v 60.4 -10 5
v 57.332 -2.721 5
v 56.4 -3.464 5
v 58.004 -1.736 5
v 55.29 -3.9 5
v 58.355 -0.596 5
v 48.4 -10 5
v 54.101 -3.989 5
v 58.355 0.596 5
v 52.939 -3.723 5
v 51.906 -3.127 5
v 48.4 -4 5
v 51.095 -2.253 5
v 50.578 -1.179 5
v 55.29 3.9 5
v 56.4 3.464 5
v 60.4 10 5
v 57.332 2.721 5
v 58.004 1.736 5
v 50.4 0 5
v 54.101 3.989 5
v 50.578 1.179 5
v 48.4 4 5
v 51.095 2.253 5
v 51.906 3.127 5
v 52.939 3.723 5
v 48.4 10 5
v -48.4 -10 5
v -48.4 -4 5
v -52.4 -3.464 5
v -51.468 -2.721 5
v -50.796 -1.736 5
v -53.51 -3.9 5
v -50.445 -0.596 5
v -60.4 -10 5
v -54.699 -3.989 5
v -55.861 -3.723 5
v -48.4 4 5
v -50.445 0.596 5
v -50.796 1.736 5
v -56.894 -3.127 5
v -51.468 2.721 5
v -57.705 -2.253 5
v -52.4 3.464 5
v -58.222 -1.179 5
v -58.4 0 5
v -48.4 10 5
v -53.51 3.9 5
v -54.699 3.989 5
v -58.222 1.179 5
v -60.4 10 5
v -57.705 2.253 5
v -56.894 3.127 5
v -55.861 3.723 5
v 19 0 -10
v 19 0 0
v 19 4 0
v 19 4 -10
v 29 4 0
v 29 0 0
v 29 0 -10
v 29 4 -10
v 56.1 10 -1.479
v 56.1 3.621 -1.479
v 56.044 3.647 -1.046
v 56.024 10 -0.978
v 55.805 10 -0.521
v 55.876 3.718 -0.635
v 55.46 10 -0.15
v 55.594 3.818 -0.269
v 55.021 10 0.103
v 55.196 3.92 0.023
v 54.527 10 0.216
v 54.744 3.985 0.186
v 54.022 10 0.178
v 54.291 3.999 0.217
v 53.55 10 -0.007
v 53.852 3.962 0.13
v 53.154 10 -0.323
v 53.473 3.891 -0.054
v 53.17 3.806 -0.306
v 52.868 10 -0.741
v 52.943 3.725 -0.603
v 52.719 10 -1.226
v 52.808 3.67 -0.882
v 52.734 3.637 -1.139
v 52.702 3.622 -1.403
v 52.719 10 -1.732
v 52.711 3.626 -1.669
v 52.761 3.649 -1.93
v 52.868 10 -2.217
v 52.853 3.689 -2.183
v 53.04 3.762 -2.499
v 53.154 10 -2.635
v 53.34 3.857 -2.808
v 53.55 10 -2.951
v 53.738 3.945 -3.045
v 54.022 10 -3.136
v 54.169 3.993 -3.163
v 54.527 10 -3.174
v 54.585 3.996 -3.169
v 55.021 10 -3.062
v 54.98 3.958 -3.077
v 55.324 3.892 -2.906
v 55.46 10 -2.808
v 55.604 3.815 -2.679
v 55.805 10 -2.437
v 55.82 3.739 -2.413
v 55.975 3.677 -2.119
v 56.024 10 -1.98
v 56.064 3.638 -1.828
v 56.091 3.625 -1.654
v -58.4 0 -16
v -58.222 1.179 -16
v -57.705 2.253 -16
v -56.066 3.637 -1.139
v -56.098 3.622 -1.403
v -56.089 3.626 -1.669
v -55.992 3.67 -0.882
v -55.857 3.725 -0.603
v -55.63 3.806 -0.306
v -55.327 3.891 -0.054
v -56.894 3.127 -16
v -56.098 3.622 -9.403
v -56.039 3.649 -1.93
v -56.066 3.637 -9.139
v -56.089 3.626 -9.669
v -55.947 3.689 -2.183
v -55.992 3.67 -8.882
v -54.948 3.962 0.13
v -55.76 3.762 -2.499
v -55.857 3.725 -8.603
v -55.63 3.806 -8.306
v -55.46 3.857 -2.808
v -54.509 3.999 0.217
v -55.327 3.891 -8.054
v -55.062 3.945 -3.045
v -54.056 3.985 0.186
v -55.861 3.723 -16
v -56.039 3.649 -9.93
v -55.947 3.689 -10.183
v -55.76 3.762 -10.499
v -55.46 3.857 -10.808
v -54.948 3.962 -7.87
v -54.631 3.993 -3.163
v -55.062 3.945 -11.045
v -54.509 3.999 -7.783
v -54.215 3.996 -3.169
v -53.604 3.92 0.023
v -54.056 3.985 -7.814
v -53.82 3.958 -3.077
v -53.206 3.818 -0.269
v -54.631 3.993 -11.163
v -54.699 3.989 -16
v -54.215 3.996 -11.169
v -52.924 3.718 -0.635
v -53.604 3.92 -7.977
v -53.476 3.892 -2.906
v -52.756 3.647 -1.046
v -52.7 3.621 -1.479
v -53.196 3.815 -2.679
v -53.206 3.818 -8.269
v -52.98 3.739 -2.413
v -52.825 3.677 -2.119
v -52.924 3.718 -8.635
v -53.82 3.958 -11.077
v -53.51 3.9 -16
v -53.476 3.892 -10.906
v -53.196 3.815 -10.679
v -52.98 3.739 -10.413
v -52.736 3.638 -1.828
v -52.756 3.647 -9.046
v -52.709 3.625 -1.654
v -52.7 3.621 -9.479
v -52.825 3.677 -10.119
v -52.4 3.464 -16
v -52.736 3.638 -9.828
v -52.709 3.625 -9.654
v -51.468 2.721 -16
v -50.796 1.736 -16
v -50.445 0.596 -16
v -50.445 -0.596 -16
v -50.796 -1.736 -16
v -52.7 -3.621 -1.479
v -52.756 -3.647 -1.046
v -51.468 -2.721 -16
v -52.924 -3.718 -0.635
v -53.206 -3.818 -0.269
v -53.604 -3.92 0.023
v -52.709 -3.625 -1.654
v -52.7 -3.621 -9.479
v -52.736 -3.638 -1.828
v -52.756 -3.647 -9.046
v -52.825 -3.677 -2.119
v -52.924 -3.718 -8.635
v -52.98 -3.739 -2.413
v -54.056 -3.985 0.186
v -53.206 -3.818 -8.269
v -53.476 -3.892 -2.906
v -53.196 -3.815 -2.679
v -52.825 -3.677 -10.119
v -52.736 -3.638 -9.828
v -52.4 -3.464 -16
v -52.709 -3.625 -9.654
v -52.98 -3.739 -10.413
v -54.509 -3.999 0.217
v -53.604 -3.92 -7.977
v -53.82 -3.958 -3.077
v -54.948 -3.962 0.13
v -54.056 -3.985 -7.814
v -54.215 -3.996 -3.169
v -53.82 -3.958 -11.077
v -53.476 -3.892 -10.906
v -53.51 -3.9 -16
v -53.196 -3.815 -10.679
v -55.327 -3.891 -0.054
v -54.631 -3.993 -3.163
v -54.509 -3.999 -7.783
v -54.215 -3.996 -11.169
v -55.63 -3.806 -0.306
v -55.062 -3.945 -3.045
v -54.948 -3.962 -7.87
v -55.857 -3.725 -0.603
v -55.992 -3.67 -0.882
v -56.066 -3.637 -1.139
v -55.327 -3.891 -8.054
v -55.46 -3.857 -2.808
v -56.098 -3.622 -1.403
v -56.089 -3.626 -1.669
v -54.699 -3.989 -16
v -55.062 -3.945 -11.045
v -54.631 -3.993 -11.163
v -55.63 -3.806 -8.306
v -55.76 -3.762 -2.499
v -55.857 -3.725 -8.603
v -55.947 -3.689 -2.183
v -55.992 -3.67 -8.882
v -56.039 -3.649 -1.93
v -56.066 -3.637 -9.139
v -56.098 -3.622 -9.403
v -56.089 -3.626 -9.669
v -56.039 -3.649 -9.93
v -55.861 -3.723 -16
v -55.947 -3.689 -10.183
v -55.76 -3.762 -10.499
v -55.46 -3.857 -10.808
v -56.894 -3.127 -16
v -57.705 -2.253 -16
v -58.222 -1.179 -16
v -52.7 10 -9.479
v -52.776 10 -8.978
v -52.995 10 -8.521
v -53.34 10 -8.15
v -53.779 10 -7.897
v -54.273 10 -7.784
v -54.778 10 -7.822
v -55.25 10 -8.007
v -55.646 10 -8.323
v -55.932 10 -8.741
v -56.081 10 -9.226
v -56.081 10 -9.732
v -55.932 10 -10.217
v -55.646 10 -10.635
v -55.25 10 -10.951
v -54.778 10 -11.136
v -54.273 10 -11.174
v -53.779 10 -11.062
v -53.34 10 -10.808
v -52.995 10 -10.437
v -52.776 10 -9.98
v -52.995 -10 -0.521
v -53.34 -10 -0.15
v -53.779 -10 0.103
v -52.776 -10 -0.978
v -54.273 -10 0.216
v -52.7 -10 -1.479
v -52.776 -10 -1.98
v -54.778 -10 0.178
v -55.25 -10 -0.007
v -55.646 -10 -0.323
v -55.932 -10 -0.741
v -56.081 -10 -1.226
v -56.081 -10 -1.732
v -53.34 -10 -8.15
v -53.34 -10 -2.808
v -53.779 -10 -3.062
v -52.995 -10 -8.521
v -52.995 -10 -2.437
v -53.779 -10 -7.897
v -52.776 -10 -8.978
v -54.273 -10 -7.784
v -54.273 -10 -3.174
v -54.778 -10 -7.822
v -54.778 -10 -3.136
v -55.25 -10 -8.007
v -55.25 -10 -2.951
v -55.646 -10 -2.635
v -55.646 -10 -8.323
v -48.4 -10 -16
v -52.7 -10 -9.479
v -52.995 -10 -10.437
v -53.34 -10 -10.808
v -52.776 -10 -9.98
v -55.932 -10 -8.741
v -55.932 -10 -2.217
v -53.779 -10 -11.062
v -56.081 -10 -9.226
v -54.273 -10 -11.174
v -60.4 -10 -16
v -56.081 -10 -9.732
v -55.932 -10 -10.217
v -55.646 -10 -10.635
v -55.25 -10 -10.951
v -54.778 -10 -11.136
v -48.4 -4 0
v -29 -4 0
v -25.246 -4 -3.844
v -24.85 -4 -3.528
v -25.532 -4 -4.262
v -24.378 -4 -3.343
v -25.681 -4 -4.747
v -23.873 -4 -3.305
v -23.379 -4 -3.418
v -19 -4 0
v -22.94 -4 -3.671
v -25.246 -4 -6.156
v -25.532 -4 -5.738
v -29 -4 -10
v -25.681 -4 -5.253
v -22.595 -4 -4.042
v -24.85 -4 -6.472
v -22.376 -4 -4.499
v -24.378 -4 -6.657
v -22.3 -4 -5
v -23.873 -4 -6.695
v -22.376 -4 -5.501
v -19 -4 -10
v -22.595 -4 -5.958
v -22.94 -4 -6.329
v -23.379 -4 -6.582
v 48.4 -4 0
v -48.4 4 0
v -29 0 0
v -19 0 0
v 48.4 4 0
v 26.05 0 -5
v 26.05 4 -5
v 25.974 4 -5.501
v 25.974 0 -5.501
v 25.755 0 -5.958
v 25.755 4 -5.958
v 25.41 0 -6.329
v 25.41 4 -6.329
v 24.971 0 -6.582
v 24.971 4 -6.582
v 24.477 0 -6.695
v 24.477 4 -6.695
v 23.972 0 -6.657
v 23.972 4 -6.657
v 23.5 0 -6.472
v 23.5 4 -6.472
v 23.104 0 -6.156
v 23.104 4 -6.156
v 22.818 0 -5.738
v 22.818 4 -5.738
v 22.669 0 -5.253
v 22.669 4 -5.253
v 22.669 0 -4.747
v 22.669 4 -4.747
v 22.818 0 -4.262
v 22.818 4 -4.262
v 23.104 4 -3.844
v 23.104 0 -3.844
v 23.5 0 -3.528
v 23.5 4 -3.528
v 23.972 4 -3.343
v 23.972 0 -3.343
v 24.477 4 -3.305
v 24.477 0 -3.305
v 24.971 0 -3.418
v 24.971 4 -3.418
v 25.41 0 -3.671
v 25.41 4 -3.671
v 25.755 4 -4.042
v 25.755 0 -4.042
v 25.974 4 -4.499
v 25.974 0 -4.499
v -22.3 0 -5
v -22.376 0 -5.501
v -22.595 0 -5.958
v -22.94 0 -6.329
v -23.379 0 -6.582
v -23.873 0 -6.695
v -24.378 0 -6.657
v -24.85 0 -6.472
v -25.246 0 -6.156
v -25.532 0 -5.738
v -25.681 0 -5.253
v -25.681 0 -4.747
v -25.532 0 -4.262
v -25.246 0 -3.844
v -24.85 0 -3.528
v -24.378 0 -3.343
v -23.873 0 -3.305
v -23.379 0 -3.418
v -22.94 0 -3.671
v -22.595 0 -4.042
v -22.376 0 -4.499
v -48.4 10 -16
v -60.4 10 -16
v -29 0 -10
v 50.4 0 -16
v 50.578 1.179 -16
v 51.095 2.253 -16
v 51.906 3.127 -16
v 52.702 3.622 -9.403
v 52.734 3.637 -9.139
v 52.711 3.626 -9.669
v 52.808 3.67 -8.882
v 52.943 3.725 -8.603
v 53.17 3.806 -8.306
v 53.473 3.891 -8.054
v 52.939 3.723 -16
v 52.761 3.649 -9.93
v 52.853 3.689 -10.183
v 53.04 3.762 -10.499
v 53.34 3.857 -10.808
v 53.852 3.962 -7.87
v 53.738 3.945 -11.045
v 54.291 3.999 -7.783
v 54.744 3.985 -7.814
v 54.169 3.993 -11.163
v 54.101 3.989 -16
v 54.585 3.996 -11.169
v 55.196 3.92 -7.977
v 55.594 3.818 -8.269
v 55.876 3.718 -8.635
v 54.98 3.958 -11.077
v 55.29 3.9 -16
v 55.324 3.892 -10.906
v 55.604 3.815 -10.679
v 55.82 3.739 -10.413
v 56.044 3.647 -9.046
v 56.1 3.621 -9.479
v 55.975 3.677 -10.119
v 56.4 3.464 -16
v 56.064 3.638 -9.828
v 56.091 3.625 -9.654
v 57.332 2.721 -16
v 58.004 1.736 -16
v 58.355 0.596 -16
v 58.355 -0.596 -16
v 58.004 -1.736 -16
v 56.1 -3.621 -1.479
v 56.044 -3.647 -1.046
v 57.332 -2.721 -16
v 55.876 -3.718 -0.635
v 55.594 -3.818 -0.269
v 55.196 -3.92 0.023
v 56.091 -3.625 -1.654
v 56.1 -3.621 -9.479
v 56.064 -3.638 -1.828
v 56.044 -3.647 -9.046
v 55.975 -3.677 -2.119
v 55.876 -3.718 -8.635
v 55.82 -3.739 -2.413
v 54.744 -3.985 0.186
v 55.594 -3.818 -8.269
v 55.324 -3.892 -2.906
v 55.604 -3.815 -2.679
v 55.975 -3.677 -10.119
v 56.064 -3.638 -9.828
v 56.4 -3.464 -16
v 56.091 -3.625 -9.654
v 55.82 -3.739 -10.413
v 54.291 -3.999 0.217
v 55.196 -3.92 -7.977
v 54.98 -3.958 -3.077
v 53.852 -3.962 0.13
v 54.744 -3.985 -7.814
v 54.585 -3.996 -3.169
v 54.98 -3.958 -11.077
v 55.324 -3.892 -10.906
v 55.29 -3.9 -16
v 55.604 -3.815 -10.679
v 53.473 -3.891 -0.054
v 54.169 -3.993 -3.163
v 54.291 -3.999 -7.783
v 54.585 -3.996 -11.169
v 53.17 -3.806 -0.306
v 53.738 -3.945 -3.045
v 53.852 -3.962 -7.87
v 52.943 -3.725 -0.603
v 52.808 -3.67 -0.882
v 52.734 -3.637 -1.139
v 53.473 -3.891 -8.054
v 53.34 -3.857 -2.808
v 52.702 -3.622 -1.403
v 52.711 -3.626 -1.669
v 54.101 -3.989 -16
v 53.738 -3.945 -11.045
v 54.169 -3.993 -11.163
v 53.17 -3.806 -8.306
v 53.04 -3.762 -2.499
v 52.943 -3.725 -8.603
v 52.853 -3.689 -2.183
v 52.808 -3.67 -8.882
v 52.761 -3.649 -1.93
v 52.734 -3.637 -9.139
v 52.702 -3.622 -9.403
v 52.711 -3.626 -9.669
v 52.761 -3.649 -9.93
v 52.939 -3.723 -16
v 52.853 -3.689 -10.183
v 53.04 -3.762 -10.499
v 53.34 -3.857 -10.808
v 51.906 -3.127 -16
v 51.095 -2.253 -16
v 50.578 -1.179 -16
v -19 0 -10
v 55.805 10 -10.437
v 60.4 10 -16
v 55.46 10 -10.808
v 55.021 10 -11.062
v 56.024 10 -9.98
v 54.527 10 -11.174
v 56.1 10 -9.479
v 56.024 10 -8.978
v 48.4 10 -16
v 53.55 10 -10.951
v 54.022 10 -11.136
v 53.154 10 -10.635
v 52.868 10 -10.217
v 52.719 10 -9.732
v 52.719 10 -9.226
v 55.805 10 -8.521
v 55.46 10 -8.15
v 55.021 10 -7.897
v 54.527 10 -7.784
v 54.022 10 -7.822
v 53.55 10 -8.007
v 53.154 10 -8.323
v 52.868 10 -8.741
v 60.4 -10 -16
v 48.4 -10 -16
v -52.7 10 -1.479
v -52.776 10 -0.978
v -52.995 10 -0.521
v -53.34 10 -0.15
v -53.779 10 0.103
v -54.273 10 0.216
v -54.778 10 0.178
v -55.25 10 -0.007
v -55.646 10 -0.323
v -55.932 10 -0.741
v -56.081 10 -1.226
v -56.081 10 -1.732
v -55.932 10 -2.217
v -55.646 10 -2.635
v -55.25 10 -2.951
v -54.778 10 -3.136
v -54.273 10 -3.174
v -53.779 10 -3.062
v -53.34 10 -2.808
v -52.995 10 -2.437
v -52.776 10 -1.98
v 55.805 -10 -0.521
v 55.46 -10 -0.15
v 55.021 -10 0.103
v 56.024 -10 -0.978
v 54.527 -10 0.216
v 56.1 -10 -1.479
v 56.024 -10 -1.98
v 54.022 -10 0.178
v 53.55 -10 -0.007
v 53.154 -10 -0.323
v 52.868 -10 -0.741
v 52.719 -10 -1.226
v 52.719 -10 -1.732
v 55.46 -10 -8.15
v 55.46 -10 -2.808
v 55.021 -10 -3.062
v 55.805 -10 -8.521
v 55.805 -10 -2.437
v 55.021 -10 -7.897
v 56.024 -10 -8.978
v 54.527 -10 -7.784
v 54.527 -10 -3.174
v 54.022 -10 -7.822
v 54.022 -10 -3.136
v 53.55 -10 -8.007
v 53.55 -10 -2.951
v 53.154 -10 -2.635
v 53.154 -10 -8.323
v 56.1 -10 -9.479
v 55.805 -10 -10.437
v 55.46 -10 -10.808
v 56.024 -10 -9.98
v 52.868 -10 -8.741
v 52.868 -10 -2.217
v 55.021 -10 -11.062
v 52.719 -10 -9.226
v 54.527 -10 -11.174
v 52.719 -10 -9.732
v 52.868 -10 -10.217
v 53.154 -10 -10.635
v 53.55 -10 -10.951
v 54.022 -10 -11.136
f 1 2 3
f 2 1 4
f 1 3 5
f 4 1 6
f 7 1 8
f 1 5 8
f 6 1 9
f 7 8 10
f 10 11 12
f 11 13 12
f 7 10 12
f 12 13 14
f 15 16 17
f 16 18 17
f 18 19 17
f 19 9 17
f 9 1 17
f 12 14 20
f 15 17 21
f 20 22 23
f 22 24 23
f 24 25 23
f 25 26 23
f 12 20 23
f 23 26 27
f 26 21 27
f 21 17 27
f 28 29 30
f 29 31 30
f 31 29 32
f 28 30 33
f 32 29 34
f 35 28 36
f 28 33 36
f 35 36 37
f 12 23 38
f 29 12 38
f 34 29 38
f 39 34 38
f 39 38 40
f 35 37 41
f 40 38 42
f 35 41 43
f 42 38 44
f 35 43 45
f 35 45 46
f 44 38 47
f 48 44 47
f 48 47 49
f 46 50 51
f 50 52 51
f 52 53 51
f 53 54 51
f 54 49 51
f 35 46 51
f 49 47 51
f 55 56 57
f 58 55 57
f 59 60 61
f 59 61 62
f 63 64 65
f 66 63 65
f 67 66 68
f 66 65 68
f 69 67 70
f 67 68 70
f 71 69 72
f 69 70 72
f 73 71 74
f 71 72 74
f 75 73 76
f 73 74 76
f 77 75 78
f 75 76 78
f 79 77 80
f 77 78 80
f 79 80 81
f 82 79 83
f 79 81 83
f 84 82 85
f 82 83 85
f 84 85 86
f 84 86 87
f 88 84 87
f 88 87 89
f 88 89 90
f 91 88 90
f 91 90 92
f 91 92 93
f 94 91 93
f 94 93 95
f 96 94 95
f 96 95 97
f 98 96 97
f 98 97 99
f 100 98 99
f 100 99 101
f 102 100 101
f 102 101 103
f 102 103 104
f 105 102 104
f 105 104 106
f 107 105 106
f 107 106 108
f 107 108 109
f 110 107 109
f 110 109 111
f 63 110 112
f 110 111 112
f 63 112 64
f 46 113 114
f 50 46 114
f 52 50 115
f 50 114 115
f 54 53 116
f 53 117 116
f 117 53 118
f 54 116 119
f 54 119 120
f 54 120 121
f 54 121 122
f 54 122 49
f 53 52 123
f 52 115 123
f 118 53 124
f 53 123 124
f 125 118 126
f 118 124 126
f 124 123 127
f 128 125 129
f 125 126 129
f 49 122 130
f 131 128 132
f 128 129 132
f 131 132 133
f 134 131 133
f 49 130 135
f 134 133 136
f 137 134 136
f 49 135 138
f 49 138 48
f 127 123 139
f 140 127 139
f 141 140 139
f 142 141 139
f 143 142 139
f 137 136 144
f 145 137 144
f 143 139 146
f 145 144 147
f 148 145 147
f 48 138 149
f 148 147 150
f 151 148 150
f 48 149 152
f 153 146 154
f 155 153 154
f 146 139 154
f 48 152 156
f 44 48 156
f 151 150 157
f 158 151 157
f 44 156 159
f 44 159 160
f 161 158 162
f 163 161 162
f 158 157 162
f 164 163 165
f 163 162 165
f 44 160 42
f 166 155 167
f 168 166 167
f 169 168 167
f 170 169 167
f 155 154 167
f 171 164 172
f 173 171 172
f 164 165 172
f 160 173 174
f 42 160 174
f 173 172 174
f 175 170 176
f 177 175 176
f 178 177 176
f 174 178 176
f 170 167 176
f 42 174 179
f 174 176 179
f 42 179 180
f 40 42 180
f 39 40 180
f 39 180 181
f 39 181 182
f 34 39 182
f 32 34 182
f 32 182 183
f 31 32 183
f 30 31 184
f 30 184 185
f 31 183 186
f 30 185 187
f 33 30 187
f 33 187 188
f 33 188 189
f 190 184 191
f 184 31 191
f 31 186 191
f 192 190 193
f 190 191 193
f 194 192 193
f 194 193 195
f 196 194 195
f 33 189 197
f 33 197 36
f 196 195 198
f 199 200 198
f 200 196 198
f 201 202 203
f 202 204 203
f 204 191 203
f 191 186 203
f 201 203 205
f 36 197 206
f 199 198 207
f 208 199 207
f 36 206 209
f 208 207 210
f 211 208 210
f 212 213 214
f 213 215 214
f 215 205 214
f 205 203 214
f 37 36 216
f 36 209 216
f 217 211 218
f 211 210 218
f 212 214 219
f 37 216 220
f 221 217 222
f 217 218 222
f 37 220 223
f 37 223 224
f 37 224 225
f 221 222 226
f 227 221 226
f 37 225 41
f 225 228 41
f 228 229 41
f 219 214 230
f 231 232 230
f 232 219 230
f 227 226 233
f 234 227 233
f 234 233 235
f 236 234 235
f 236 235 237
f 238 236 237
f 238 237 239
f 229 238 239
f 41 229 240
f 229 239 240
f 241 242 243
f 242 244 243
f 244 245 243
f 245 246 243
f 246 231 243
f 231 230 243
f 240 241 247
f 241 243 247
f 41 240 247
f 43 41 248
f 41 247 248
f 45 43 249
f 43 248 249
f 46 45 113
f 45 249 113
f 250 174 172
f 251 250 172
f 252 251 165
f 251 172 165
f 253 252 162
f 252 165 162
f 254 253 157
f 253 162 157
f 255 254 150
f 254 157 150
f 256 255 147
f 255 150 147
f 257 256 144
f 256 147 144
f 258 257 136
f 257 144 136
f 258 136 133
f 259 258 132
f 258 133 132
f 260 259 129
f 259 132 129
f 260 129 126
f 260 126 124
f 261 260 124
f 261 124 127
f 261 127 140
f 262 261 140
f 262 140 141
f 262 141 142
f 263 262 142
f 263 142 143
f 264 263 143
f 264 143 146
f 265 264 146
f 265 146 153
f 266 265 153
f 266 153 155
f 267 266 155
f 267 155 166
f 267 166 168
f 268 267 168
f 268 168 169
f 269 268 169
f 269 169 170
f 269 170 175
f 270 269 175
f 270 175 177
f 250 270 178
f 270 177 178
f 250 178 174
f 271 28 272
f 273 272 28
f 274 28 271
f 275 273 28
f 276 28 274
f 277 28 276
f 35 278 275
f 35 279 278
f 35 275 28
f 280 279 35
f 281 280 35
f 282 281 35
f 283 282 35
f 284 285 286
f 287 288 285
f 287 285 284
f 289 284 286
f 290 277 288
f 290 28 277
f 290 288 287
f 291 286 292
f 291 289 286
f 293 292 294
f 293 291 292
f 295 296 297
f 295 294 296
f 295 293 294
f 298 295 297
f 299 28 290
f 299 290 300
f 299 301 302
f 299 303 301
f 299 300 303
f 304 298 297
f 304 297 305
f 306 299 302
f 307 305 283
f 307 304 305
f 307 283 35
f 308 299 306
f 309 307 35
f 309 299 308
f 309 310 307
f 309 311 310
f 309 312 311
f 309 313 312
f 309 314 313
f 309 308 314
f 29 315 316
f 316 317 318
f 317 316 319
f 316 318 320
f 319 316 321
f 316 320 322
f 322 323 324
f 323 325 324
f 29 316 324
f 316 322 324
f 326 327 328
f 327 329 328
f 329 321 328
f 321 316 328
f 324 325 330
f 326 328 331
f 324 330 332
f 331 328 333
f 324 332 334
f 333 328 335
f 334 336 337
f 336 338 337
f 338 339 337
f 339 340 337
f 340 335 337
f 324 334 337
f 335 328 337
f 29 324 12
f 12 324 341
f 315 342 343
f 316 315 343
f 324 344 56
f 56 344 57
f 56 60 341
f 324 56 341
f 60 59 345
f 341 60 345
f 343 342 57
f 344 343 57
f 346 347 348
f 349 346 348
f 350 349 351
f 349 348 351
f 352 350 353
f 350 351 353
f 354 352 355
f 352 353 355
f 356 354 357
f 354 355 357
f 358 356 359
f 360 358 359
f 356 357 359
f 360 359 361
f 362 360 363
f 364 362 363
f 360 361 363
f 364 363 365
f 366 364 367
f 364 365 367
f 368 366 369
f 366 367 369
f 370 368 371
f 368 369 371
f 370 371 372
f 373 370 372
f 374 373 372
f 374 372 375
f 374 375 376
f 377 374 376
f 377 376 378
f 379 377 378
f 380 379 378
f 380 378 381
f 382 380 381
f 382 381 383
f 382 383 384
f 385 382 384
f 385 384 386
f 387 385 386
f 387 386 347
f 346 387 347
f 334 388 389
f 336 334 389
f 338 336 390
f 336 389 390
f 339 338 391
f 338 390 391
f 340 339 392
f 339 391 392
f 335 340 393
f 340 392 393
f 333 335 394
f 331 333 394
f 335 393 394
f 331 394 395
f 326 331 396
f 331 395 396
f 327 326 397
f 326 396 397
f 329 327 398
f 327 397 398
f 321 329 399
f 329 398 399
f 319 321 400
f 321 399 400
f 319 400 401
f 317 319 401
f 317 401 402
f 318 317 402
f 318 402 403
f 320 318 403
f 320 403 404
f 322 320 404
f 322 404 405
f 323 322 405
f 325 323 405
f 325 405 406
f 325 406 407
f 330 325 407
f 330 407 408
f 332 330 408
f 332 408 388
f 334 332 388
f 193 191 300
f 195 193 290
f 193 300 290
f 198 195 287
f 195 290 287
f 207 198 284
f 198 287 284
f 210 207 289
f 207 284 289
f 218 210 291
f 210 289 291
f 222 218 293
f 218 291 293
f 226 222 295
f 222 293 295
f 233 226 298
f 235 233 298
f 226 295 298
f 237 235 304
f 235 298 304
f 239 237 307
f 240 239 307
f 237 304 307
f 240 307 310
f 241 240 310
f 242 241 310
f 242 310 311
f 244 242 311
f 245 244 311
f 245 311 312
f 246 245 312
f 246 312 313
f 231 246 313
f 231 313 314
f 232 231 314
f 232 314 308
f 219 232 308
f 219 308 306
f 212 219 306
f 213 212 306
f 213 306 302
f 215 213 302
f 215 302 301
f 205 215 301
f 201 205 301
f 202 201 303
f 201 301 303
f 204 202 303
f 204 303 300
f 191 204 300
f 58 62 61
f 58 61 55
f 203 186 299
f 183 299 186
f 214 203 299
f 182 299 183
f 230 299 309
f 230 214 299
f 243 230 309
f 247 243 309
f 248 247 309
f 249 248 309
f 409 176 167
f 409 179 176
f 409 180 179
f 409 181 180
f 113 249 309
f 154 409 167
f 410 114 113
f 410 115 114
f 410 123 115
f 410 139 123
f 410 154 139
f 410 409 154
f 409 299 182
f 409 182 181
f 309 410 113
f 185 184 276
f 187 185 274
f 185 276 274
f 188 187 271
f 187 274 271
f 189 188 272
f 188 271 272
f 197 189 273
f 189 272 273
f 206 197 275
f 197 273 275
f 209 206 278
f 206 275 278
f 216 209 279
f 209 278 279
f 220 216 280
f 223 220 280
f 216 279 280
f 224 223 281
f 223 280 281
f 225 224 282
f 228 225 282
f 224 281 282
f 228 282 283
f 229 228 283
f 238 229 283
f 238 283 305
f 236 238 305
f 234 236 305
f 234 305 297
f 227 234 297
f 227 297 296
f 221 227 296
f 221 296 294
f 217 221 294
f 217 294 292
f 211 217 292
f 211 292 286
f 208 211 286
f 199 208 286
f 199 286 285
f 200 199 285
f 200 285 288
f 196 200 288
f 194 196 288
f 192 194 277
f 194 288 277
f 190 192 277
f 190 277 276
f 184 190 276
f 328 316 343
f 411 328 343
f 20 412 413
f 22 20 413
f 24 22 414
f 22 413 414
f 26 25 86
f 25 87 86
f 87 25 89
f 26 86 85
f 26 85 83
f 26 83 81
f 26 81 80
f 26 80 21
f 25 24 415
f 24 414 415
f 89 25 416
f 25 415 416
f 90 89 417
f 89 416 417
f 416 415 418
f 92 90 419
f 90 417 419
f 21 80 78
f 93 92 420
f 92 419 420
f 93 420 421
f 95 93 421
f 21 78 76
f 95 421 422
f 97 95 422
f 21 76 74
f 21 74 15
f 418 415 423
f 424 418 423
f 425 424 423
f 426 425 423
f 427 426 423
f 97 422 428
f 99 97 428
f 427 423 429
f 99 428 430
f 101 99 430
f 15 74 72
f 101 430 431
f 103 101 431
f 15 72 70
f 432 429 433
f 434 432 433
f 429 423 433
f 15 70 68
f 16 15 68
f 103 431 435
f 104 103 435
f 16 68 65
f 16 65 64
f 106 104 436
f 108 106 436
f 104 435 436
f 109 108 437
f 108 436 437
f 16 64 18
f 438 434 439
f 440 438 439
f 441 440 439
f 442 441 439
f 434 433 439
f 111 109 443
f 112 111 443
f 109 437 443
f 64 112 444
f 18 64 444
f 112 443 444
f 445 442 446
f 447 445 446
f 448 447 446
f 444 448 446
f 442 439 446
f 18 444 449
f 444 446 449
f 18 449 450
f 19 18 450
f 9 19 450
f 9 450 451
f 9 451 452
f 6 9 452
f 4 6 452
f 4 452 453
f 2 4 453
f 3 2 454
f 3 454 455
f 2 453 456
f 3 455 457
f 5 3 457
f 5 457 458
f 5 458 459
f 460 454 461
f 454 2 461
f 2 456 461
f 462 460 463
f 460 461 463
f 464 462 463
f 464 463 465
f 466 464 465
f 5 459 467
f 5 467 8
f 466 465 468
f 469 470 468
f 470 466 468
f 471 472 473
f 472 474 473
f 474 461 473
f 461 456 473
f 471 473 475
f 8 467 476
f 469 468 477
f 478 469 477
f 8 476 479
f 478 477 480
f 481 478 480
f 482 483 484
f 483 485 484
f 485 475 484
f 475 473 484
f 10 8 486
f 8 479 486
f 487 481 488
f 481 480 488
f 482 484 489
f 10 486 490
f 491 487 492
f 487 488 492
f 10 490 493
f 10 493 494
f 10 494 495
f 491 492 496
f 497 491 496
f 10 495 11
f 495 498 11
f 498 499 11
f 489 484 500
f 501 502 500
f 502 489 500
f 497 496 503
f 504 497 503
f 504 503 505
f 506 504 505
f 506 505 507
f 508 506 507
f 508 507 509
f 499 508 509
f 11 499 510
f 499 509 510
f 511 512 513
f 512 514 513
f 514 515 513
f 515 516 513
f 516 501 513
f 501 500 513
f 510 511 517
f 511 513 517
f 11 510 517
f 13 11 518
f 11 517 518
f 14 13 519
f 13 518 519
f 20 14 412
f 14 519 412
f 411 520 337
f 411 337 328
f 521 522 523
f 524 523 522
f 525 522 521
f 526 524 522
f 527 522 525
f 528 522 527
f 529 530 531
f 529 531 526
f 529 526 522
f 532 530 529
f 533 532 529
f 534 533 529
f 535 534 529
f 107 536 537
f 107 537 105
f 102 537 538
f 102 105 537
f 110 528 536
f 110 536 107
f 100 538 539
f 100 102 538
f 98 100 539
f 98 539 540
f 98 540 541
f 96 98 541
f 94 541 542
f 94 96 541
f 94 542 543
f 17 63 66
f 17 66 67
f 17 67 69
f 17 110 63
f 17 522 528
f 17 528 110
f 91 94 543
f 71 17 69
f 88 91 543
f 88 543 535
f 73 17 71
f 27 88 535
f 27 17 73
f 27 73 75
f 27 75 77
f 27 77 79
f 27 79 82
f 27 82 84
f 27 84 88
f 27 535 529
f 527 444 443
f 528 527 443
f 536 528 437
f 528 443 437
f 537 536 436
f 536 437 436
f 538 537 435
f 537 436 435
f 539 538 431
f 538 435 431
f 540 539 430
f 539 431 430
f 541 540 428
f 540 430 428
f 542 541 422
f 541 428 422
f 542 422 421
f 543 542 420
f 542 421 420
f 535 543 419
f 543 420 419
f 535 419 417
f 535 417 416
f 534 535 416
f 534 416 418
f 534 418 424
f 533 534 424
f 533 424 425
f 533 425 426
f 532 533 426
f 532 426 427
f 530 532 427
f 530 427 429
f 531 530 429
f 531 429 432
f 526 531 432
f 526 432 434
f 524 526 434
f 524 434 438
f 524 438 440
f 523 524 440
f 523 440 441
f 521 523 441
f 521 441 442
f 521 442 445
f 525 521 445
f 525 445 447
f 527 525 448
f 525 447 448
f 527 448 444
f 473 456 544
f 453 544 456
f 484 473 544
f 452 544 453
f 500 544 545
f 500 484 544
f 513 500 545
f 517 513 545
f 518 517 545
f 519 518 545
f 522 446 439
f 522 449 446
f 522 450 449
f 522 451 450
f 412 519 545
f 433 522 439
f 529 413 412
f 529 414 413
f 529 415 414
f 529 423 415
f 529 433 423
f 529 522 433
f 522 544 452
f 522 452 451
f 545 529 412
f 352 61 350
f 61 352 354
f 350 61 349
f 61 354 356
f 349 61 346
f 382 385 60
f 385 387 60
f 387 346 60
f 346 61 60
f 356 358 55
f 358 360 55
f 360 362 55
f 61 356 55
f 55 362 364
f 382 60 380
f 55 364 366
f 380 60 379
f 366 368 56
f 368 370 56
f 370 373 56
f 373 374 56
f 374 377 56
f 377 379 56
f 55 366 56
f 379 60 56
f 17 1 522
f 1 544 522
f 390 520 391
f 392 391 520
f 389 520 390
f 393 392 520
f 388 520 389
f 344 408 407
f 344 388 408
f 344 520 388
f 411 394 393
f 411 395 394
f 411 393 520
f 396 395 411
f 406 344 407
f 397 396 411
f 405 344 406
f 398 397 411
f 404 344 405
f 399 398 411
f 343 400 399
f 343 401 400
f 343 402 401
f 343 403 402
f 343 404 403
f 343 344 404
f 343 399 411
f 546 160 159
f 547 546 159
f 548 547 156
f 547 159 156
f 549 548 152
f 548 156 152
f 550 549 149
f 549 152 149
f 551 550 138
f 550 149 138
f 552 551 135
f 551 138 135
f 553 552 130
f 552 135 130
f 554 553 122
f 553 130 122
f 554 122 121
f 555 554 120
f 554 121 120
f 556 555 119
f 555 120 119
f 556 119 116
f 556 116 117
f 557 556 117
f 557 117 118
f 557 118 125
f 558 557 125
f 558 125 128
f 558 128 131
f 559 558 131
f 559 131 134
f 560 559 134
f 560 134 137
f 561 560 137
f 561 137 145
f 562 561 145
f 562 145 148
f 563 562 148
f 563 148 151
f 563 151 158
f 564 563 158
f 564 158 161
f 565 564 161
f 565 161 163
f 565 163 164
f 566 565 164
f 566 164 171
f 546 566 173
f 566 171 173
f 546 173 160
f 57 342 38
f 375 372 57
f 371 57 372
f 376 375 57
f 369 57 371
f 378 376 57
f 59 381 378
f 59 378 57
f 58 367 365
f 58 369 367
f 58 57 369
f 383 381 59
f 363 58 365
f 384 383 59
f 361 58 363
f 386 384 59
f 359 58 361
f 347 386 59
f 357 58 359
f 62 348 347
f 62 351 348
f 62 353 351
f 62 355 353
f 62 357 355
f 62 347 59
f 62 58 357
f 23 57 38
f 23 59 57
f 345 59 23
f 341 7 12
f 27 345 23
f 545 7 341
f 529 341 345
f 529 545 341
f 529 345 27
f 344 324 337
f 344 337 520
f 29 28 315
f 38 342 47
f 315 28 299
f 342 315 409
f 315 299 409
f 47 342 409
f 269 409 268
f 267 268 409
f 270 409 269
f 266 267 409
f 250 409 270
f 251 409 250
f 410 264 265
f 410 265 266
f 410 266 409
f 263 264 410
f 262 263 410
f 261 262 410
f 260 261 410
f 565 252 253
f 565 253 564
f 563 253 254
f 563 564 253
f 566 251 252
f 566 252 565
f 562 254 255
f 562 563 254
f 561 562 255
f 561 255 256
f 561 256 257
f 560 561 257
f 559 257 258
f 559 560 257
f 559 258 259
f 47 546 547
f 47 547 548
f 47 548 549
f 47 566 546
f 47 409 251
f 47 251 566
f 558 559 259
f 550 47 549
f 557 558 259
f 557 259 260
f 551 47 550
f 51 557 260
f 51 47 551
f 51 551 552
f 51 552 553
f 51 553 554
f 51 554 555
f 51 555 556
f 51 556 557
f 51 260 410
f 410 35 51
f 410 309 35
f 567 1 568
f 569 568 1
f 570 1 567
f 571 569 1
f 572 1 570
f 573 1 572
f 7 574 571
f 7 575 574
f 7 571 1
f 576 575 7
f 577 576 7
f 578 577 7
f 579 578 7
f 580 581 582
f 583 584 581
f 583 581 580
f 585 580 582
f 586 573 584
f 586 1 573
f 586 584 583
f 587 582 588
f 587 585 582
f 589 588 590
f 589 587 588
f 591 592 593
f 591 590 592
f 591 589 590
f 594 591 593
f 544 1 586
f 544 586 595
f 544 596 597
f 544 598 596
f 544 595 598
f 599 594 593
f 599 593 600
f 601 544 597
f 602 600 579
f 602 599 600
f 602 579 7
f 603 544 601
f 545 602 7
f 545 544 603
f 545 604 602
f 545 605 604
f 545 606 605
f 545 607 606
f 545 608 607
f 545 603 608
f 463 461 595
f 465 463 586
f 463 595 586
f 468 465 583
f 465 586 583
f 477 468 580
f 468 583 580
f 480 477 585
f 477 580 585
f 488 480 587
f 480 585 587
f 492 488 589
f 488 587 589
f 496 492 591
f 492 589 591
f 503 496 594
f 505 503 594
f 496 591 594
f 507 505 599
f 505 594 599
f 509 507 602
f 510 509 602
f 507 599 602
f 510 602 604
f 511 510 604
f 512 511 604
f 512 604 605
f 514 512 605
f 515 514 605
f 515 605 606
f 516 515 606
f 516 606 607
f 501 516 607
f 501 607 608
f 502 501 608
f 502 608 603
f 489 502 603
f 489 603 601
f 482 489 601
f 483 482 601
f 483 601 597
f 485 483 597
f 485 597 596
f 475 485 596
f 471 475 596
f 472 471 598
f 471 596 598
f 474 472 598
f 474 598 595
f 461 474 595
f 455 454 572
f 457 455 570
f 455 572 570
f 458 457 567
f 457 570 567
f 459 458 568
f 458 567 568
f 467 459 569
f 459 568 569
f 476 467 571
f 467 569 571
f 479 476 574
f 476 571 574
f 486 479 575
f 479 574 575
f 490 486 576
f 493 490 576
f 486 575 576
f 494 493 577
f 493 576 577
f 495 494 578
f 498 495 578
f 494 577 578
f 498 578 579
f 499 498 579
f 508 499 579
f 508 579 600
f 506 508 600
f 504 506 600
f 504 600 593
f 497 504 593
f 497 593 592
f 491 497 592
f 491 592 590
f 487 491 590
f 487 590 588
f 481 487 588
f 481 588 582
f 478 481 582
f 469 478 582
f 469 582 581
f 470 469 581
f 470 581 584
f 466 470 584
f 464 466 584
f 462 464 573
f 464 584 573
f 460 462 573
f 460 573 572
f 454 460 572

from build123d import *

# Parameters (mm, degrees)
ESQUISSE1_W             = 120.8
ESQUISSE1_H             = 8
BOSS_EXTRU_1_DEPTH      = 5
ESQUISSE2_W             = 10
ESQUISSE2_H             = 4
BOSS_EXTRU_2_DEPTH      = 10
ESQUISSE3_R             = 1.7
ENL_V_MAT_EXTRU_1_DEPTH = 10
ESQUISSE4_W             = 12
ESQUISSE4_H             = 20
BOSS_EXTRU_3_DEPTH      = 16
BOSS_EXTRU_3_DEPTH_BACK = 5
ESQUISSE5_R             = 4
ENL_V_MAT_EXTRU_2_DEPTH = 24
ESQUISSE6_R             = 1.7
ENL_V_MAT_EXTRU_3_DEPTH = 24


with BuildPart() as part:
    # Esquisse1 → Boss.-Extru.1 (new body)
    with BuildSketch(Plane.XY):
        Rectangle(ESQUISSE1_W, ESQUISSE1_H)
    extrude(amount=BOSS_EXTRU_1_DEPTH)

    # Esquisse2 → Boss.-Extru.2 (add)
    with BuildSketch(Plane(origin=(0, 0, 0), x_dir=(-1, 0, 0), z_dir=(0, 0, -1))):
        with Locations((24, -2)):
            Rectangle(ESQUISSE2_W, ESQUISSE2_H)
        with Locations((-24, 2)):
            Rectangle(ESQUISSE2_W, ESQUISSE2_H)
    extrude(amount=BOSS_EXTRU_2_DEPTH)

    # Esquisse3 → Enlèv. mat.-Extru.1 (cut)
    with BuildSketch(Plane(origin=(0, 4, 0), x_dir=(1, 0, 0), z_dir=(0, 1, 0))):
        with Locations((-24, 5)):
            Circle(ESQUISSE3_R)
        with Locations((24.35, 5)):
            Circle(ESQUISSE3_R)
    extrude(amount=-ENL_V_MAT_EXTRU_1_DEPTH, mode=Mode.SUBTRACT)

    # Esquisse4 → Boss.-Extru.3 (add, two sides)
    with BuildSketch(Plane(origin=(0, 0, 0), x_dir=(-1, 0, 0), z_dir=(0, 0, -1))) as boss_extru_3_sk:
        with Locations((54.4, 0)):
            Rectangle(ESQUISSE4_W, ESQUISSE4_H)
        with Locations((-54.4, 0)):
            Rectangle(ESQUISSE4_W, ESQUISSE4_H)
    extrude(amount=BOSS_EXTRU_3_DEPTH)
    extrude(boss_extru_3_sk.sketch, amount=-BOSS_EXTRU_3_DEPTH_BACK)

    # Esquisse5 → Enlèv. mat.-Extru.2 (cut)
    with BuildSketch(Plane(origin=(0, 0, -16), x_dir=(-1, 0, 0), z_dir=(0, 0, -1))):
        with Locations((54.4, 0)):
            Circle(ESQUISSE5_R)
        with Locations((-54.4, 0)):
            Circle(ESQUISSE5_R)
    extrude(amount=-ENL_V_MAT_EXTRU_2_DEPTH, mode=Mode.SUBTRACT)

    # Esquisse6 → Enlèv. mat.-Extru.3 (cut)
    with BuildSketch(Plane.XZ.offset(10)):
        with Locations((54.4, -9.479015636)):
            Circle(ESQUISSE6_R)
        with Locations((54.4, -1.479015636)):
            Circle(ESQUISSE6_R)
        with Locations((-54.4, -1.479015636)):
            Circle(ESQUISSE6_R)
        with Locations((-54.4, -9.479015636)):
            Circle(ESQUISSE6_R)
    extrude(amount=-ENL_V_MAT_EXTRU_3_DEPTH, mode=Mode.SUBTRACT)


solid = part.part
